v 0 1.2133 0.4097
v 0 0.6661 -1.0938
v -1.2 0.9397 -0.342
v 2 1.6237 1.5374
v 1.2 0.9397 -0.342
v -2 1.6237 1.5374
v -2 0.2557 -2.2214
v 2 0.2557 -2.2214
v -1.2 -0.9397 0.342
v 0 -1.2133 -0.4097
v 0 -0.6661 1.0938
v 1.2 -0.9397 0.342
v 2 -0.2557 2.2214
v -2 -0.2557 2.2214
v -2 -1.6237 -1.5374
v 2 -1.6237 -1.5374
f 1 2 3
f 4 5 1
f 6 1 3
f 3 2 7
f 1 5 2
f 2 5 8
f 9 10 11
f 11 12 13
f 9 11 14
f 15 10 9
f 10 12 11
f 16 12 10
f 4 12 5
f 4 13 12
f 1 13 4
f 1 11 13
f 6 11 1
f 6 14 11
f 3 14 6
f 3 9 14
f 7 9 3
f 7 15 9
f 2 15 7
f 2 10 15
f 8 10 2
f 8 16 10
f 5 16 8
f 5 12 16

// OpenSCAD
//=============================================================================
// Icon used for creating an extruded model.
//=============================================================================

module CreateExtrudedIcon() {
  points=[
          [-1, -1],
          [ 0, -.4],
          [ 1, -1],
          [ .6, 0],
          [ 1,  1],
          [ 0, .4],
          [-1,  1],
          [-.6, 0],
          ];

  rotate(70, [1, 0, 0]) linear_extrude(height=2, center=true, $fn=1)
    scale([2,2,2]) polygon(points);
}

CreateExtrudedIcon();
